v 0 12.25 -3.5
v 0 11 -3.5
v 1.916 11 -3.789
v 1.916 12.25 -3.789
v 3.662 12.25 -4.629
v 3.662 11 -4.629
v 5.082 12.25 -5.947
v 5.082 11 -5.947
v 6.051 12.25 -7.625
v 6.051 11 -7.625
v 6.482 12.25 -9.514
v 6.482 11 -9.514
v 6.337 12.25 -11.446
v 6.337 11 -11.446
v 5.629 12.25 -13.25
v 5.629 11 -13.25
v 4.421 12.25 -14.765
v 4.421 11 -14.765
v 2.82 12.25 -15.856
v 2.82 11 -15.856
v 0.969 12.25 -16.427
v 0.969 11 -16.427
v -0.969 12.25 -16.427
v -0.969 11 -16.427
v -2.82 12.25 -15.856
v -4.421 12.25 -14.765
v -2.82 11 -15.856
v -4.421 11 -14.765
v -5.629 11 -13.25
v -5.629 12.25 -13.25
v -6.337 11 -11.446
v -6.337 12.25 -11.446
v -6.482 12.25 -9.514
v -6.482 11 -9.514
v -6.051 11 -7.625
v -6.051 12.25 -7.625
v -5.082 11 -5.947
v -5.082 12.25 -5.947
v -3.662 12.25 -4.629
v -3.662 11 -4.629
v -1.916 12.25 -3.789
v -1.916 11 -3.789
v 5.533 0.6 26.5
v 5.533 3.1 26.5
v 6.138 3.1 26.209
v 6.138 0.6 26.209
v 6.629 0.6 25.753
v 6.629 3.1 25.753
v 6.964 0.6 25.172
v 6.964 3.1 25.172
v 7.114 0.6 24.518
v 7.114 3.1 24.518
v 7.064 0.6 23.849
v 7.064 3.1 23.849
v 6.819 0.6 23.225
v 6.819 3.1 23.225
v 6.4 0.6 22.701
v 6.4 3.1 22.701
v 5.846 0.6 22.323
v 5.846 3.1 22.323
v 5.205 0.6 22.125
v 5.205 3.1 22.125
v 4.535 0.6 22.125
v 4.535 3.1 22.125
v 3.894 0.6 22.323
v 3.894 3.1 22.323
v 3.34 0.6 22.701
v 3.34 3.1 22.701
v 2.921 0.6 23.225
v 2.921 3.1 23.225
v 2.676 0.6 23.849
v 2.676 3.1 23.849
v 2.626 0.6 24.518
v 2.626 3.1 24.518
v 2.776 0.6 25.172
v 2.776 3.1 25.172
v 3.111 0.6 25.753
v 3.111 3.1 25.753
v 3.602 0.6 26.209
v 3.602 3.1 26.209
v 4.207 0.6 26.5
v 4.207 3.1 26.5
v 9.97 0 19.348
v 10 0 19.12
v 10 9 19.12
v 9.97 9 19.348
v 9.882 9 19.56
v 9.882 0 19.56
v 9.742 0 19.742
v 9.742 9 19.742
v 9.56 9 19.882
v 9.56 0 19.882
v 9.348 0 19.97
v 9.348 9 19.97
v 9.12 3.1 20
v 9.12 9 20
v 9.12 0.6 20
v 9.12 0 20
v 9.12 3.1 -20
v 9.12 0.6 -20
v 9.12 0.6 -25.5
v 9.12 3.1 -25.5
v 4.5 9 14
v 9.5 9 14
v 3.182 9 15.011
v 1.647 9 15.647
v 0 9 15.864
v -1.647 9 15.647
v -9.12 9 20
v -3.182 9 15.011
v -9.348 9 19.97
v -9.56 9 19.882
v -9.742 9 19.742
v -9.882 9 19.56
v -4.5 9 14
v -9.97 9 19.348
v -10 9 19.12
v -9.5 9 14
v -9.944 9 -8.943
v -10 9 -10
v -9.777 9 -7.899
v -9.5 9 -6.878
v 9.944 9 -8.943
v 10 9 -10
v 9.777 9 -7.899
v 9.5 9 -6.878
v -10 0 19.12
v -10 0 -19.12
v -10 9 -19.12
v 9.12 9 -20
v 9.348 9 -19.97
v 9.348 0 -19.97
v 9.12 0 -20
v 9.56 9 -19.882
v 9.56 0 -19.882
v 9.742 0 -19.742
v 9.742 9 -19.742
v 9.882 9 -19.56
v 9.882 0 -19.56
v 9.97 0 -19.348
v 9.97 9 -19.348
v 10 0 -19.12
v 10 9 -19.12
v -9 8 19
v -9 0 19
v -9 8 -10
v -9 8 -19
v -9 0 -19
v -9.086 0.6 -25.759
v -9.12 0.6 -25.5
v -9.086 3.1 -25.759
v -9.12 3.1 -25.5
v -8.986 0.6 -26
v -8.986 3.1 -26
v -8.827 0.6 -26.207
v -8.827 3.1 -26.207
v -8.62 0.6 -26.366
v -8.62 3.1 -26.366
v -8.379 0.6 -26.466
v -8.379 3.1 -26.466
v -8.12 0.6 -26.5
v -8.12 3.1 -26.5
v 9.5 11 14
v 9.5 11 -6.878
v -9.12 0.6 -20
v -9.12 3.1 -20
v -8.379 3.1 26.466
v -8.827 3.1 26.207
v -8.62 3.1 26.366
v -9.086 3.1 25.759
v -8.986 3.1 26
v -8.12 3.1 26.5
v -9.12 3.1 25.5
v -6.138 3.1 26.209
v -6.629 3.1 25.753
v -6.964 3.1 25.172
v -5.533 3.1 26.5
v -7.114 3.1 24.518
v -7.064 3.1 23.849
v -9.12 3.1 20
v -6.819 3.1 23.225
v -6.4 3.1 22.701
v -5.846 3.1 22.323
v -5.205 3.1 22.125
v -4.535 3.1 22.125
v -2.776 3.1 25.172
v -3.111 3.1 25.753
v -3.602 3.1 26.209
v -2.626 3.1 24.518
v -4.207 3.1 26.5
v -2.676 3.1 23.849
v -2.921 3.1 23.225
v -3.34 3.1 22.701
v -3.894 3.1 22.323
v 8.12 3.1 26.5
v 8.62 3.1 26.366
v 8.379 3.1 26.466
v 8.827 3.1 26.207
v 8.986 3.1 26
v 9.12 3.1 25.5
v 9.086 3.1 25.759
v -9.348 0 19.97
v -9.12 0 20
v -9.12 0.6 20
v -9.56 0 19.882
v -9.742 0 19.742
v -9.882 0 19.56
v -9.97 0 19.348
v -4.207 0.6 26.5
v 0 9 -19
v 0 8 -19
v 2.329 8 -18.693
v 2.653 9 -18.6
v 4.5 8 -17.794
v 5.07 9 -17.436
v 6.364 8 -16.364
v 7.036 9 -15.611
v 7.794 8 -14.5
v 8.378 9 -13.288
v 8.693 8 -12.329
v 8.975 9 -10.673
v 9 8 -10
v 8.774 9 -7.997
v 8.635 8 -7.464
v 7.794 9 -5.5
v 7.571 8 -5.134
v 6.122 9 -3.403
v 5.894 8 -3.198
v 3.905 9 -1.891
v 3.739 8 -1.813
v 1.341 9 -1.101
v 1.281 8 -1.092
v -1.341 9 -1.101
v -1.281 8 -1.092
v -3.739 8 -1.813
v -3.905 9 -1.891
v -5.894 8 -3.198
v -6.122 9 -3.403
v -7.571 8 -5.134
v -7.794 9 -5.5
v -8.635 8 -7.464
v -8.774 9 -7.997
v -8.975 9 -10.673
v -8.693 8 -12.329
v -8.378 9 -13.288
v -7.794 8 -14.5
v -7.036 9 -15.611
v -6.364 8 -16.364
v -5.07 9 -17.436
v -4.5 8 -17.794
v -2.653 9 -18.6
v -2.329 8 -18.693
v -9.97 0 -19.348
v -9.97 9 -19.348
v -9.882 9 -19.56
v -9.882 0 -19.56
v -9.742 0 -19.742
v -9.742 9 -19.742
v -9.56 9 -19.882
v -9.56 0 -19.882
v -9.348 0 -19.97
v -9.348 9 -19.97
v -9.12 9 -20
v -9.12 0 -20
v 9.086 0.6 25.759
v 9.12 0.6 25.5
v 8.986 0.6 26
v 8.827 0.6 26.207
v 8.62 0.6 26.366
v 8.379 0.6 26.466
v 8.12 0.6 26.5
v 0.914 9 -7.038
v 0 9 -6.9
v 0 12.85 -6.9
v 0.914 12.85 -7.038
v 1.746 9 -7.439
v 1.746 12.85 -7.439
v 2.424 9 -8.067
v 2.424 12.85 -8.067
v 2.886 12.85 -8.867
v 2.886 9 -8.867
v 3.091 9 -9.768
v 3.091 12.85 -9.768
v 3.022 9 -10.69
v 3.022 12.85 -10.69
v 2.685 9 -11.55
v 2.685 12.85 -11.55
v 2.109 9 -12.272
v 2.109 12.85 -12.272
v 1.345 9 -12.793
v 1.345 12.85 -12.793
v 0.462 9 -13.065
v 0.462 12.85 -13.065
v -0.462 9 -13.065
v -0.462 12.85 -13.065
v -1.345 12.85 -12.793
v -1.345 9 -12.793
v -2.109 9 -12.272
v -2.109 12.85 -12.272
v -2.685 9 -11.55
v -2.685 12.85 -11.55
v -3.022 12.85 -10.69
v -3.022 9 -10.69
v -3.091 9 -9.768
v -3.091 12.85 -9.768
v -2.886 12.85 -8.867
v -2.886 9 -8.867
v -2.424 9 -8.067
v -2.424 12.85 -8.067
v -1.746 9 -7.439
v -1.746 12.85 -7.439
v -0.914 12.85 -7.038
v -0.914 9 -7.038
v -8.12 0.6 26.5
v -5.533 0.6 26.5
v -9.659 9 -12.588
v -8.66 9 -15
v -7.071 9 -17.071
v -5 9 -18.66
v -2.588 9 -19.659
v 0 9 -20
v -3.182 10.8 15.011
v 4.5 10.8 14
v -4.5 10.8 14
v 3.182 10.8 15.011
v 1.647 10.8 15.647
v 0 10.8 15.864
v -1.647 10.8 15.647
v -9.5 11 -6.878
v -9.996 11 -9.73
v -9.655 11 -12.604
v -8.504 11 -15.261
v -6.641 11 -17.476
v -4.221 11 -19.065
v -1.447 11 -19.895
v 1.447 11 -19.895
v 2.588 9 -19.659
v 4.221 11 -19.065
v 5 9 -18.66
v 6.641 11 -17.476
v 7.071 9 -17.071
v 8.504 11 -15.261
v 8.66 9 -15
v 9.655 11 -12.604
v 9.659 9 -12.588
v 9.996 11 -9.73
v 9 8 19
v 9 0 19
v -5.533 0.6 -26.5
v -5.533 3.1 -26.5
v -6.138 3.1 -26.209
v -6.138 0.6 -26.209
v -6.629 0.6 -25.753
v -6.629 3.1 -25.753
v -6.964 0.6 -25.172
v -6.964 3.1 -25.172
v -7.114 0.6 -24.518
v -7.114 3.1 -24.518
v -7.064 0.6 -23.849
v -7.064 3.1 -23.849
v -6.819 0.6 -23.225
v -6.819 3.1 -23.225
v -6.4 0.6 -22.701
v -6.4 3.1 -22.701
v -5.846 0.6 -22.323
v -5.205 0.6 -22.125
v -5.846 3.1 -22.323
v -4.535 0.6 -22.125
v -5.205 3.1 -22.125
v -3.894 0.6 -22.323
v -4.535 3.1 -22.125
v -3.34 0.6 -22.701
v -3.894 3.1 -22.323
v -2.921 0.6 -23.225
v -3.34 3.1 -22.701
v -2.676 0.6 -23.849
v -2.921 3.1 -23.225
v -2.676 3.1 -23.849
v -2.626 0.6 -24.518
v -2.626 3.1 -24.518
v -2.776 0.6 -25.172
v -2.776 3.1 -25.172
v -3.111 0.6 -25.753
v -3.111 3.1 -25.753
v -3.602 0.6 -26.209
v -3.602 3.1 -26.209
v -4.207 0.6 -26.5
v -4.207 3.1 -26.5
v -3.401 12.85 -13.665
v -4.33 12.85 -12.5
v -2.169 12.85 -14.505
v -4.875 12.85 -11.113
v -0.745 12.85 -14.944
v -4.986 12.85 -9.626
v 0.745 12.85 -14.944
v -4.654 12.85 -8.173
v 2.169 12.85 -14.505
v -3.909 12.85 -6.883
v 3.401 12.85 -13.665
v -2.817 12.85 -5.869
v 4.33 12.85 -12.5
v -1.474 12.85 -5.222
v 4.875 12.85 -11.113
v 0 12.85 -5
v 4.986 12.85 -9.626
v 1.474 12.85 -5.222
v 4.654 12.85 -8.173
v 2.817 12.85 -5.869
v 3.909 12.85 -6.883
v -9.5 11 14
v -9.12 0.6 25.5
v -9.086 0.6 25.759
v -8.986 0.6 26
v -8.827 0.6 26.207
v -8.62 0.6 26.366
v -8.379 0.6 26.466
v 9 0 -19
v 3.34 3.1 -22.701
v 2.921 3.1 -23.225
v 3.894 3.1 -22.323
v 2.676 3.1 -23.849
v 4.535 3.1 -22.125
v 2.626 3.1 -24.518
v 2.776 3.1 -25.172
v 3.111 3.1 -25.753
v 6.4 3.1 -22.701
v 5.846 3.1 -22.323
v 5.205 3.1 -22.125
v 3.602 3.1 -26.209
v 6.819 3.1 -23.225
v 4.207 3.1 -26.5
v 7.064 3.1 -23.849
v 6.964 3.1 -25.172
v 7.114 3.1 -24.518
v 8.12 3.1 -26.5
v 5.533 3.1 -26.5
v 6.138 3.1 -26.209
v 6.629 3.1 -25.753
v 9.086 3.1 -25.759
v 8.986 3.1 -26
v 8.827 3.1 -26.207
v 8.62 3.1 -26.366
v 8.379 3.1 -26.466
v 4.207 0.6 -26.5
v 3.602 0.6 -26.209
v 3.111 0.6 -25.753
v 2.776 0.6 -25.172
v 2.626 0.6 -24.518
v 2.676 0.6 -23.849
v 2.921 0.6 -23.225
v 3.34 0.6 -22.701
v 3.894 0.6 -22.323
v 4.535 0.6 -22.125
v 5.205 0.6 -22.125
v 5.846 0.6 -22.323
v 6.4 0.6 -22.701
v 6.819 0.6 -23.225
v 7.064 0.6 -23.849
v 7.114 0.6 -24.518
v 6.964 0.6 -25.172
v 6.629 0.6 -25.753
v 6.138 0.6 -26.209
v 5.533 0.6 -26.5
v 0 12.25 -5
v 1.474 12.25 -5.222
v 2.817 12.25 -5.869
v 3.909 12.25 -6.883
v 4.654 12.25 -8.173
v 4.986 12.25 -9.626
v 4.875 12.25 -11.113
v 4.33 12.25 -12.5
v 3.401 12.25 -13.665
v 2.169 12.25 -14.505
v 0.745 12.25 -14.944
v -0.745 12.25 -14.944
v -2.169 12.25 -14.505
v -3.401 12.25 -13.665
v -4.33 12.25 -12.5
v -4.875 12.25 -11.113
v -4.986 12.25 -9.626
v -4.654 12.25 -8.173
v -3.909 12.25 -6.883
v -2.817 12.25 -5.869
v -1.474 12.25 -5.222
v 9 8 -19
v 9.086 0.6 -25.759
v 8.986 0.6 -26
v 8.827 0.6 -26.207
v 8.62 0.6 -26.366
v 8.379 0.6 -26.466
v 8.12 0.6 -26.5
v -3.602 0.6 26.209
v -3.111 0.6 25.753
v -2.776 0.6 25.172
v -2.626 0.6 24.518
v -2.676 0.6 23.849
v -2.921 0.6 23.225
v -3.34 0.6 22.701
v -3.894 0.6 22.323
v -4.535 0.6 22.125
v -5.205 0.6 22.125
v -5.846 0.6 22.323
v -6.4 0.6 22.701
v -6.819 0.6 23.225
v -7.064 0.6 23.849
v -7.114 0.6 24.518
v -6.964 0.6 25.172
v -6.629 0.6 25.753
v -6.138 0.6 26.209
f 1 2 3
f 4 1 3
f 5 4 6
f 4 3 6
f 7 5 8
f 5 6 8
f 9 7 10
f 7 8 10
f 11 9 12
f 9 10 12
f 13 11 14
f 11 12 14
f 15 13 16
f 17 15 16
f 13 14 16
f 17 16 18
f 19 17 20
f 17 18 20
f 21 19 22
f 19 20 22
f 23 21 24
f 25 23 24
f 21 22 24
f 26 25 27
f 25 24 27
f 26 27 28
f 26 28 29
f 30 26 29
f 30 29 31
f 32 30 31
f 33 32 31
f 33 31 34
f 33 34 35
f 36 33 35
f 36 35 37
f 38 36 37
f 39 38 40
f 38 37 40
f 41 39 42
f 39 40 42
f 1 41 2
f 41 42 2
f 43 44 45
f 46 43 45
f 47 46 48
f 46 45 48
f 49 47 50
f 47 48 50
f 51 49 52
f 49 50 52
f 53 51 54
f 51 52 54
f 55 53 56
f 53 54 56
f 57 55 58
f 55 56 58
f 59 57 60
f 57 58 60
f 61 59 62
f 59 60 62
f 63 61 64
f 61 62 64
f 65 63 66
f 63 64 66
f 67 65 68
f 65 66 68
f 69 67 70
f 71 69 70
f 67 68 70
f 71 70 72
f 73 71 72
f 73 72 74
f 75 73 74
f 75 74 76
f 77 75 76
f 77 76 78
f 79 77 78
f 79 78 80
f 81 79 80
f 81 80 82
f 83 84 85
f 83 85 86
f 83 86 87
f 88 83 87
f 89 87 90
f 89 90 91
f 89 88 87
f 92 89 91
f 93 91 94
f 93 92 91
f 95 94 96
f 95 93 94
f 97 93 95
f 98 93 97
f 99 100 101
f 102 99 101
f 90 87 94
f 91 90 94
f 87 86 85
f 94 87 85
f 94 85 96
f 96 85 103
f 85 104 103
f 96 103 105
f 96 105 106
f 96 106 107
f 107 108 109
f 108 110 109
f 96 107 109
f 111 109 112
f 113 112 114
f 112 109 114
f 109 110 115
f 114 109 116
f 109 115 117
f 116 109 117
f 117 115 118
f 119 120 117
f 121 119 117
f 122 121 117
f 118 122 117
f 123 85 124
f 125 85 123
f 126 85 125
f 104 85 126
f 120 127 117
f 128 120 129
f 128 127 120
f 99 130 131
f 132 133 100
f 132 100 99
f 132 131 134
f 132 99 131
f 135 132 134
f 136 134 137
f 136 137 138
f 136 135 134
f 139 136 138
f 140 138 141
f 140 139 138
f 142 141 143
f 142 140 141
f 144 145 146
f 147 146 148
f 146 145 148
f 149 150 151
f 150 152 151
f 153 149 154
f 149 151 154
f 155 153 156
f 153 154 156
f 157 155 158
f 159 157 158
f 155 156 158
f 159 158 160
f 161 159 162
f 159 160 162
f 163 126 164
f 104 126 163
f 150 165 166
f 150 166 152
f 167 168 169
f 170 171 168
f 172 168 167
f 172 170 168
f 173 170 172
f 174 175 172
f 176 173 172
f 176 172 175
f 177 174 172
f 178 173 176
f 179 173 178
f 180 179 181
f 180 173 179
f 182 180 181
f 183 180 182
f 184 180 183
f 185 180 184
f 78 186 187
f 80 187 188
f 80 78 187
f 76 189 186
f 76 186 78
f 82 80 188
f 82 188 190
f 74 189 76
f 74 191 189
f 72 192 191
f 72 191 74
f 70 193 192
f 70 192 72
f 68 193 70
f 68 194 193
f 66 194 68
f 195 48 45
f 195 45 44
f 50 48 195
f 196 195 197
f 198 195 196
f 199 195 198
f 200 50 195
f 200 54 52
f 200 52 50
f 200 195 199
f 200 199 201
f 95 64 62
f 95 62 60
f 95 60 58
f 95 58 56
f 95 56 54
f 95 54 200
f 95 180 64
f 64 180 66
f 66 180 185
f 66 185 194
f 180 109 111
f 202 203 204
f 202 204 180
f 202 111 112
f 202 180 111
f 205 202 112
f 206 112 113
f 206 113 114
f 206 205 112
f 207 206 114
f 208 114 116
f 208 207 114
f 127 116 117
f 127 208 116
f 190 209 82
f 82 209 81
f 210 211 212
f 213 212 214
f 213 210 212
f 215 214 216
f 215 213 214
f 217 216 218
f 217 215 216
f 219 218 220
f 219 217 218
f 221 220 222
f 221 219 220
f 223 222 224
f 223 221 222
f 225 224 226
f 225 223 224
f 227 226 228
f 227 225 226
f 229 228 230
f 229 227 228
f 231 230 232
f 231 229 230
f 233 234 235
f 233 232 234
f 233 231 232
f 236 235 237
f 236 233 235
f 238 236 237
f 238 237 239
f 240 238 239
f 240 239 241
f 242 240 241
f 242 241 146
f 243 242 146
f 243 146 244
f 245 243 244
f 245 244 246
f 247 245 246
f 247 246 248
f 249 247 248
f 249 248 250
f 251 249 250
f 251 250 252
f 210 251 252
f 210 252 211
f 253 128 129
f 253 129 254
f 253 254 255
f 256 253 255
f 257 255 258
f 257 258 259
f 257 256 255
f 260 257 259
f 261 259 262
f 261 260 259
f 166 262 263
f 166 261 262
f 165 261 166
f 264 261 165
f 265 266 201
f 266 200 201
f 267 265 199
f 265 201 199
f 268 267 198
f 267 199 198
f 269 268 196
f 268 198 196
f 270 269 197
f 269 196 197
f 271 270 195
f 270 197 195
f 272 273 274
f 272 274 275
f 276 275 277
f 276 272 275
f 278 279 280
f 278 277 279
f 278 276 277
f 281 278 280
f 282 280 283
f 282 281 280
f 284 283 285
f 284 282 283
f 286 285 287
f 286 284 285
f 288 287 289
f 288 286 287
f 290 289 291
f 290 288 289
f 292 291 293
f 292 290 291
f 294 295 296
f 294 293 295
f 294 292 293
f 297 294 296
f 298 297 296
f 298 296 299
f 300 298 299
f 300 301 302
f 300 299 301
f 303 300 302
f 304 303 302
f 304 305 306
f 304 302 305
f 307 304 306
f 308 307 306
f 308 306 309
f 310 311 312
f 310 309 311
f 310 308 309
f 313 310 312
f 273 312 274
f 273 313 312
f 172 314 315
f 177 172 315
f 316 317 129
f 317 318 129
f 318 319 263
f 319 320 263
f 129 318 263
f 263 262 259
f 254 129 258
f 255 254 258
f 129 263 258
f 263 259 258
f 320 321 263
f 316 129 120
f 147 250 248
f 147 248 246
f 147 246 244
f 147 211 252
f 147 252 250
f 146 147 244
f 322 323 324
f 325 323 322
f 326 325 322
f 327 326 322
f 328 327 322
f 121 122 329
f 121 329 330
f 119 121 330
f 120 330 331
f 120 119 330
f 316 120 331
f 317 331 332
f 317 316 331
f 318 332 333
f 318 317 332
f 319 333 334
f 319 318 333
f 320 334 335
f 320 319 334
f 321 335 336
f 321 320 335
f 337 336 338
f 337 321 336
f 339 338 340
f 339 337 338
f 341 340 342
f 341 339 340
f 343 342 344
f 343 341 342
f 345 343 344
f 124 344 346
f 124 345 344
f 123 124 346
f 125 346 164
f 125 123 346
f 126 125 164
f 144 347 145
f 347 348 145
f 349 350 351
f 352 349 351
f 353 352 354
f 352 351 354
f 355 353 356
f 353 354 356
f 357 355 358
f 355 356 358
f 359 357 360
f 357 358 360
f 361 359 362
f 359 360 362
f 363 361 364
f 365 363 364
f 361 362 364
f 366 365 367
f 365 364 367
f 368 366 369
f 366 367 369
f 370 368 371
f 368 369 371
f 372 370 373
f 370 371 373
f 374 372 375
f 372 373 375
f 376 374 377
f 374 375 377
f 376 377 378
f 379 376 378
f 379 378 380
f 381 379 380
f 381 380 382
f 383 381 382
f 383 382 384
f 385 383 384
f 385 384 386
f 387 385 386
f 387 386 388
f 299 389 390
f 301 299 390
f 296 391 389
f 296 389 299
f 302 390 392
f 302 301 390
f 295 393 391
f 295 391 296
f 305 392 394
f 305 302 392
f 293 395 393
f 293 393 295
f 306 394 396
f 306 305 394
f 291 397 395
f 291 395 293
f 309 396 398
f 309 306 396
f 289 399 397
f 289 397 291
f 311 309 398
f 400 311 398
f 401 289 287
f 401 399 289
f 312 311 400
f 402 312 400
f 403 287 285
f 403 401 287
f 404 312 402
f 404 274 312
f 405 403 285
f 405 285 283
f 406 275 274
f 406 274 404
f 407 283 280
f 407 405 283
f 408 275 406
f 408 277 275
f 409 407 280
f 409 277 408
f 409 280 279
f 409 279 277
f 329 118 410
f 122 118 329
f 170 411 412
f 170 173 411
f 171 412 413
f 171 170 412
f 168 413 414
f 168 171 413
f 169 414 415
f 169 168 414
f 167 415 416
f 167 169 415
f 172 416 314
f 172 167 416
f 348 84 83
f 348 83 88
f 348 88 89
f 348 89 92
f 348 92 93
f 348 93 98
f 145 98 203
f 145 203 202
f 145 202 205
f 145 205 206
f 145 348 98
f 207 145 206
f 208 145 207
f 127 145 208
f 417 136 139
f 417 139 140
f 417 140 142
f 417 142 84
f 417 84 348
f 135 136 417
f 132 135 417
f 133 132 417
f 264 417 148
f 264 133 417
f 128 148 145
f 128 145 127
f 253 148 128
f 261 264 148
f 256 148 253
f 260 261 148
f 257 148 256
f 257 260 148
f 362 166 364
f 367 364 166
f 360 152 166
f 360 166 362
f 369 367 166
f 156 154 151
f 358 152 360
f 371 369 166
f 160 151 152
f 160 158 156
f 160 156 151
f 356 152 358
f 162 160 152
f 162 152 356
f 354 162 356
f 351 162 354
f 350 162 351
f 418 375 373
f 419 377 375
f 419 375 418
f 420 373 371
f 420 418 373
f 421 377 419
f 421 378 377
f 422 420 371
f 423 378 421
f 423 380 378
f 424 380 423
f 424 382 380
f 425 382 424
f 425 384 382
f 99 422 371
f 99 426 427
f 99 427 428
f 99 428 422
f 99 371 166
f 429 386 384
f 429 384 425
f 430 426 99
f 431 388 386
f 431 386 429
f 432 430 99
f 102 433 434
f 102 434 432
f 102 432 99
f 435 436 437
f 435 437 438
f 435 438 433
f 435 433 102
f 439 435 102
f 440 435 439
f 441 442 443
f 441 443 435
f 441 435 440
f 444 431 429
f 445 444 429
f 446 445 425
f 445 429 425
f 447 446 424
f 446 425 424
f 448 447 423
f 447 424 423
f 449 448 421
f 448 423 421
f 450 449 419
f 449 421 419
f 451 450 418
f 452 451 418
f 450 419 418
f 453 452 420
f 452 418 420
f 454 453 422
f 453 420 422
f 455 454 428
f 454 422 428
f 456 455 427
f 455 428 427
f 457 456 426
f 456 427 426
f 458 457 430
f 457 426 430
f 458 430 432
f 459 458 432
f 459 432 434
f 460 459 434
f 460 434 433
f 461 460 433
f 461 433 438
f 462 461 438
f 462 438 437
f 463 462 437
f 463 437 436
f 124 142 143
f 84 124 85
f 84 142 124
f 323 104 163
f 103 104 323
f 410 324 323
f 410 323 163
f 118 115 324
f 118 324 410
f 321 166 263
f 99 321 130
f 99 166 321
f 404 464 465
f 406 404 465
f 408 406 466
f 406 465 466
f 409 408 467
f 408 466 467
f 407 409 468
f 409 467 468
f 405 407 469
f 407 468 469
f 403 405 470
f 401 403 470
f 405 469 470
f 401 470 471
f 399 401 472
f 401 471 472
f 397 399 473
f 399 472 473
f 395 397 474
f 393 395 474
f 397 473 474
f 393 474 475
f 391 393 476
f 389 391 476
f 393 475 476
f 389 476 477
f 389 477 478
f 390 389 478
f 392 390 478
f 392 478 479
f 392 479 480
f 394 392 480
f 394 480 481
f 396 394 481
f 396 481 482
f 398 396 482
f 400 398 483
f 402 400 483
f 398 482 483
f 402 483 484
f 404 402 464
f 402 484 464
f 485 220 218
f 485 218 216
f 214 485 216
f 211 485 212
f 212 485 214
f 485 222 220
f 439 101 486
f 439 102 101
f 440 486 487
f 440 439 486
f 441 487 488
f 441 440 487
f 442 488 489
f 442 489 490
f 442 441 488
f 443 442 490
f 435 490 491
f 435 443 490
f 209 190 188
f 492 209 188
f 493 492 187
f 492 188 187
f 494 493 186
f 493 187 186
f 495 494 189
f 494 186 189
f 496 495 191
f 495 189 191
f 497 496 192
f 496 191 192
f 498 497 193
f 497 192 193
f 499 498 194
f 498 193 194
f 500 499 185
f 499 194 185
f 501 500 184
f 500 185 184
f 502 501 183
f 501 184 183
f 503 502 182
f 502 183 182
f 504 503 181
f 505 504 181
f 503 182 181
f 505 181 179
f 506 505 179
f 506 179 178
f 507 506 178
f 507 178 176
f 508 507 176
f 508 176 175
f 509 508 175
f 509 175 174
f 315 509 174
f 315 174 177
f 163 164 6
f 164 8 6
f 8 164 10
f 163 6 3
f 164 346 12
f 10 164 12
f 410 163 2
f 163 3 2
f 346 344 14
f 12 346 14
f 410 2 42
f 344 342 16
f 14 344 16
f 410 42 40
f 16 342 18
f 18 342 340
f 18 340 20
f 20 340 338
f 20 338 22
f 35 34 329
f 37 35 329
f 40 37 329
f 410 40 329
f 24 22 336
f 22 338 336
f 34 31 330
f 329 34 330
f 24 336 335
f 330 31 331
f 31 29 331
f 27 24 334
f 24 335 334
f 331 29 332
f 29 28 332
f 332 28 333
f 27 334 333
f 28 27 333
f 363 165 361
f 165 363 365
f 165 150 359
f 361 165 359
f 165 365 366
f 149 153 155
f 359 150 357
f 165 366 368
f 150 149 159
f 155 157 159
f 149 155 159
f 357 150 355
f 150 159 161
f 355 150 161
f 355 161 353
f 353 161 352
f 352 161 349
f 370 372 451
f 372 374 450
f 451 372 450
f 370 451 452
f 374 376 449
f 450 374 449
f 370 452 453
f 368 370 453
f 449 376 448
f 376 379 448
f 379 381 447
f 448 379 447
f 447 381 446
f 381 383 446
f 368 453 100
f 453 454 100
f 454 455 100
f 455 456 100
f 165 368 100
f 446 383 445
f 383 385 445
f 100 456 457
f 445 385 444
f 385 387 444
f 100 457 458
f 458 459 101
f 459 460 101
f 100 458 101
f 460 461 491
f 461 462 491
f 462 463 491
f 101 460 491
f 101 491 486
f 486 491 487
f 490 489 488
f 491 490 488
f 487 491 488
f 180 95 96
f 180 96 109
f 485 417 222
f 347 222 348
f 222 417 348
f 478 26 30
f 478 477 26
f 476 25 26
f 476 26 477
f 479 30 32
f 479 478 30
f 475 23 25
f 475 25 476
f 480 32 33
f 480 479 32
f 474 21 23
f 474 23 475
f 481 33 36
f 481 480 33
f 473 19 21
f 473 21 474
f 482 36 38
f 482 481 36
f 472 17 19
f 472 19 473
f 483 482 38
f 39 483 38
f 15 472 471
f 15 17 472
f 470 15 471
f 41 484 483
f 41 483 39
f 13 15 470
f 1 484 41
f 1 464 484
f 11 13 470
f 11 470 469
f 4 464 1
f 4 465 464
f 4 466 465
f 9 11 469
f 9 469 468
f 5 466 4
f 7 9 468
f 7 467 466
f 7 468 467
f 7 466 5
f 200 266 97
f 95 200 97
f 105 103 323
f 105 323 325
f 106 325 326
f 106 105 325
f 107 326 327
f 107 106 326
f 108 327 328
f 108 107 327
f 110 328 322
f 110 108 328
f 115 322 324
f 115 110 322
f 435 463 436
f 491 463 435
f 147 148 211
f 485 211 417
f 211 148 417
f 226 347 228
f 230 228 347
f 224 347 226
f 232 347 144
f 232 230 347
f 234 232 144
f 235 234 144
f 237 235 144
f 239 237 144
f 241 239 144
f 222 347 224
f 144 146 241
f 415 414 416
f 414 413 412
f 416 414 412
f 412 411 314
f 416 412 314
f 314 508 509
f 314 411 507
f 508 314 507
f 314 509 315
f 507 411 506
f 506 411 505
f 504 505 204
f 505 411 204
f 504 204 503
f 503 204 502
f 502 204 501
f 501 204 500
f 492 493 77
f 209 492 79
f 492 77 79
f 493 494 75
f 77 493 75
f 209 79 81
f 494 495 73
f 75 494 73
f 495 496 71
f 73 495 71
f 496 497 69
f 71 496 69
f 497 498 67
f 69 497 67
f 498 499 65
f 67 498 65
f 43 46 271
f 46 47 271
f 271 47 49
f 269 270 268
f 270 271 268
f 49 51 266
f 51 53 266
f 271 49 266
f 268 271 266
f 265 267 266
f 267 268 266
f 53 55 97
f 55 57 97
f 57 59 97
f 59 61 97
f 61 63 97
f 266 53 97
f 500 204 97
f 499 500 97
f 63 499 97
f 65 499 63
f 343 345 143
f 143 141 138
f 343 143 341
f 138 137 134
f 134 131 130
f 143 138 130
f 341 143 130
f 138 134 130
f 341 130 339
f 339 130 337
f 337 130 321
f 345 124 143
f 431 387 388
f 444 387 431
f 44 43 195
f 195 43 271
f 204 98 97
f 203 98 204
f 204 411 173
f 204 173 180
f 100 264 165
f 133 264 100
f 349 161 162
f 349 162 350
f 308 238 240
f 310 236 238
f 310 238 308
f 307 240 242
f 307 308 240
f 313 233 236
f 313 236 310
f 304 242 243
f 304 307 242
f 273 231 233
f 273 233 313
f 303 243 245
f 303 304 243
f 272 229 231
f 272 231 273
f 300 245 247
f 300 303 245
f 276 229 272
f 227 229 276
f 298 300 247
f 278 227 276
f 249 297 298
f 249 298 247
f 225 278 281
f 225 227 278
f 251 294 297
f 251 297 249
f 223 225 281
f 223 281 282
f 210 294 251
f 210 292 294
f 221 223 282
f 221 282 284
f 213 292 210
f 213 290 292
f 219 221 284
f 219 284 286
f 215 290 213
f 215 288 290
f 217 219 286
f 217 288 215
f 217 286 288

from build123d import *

# Parameters (mm, degrees)
BOSS_EXTRUDE1_DEPTH     = 9
SHELL1_T                = -1
BOSS_EXTRUDE2_DEPTH     = 2
SKETCH3_R               = 6.5
BOSS_EXTRUDE3_DEPTH     = 1.25
SKETCH4_R               = 5
BOSS_EXTRUDE4_DEPTH     = 0.6
CUT_EXTRUDE1_DEPTH      = 26.78996898
CUT_EXTRUDE1_DEPTH_BACK = 26.78996898
SKETCH5_R               = 3.1
BOSS_EXTRUDE5_DEPTH     = 1.8
SKETCH7_W               = 18.24
SKETCH7_H               = 6.5
BOSS_EXTRUDE6_DEPTH     = 2.5
CUT_EXTRUDE2_REACH      = 31.955
SKETCH8_R               = 2.25
FILLET2_R               = 1
CUT_EXTRUDE3_DEPTH      = 30.432125306
CUT_EXTRUDE3_DEPTH_BACK = 1
SKETCH9_R               = 9


with BuildPart() as part:
    # Sketch1 → Boss-Extrude1 (new body)
    with BuildSketch(Plane(origin=(0, 0, 0), x_dir=(1, 0, 0), z_dir=(0, 1, 0))):
        with BuildLine():
            Line((-9.12, 20), (9.12, 20))
            ThreePointArc((9.12, 20), (9.742253967, 19.742253967), (10, 19.12))
            Line((10, 19.12), (10, -19.12))
            ThreePointArc((10, -19.12), (9.742253967, -19.742253967), (9.12, -20))
            Line((9.12, -20), (-9.12, -20))
            ThreePointArc((-9.12, -20), (-9.742253967, -19.742253967), (-10, -19.12))
            Line((-10, -19.12), (-10, 19.12))
            ThreePointArc((-10, 19.12), (-9.742253967, 19.742253967), (-9.12, 20))
        make_face()
    extrude(amount=BOSS_EXTRUDE1_DEPTH)

    # Shell1
    shell1_openings = [part.faces().sort_by_distance(p)[0] for p in [
        (0, 0, 0),
    ]]
    offset(amount=SHELL1_T, openings=shell1_openings, kind=Kind.INTERSECTION)

    # Sketch2 → Boss-Extrude2 (add)
    with BuildSketch(Plane(origin=(0, 9, 0), x_dir=(1, 0, 0), z_dir=(0, 1, 0))):
        with BuildLine():
            Line((9.5, -14), (-9.5, -14))
            Line((-9.5, -14), (-9.5, 6.877501001))
            ThreePointArc((-9.5, 6.877501001), (0, 20), (9.5, 6.877501001))
            Line((9.5, 6.877501001), (9.5, -14))
        make_face()
    extrude(amount=BOSS_EXTRUDE2_DEPTH)

    # Sketch3 → Boss-Extrude3 (add)
    with BuildSketch(Plane(origin=(0, 11, 0), x_dir=(1, 0, 0), z_dir=(0, 1, 0))):
        with Locations(Location((0, 10, 0), (0, 0, 270))):
            Circle(SKETCH3_R)
    extrude(amount=BOSS_EXTRUDE3_DEPTH)

    # Sketch4 → Boss-Extrude4 (add)
    with BuildSketch(Plane(origin=(0, 12.25, 0), x_dir=(1, 0, 0), z_dir=(0, 1, 0))):
        with Locations(Location((0, 10, 0), (0, 0, 270))):
            Circle(SKETCH4_R)
    extrude(amount=BOSS_EXTRUDE4_DEPTH)

    # Sketch5 → Cut-Extrude1 (cut, two sides: drawn at the far end of the back side and taken through both)
    with BuildSketch(Plane(origin=(0, 12.85, 0), x_dir=(1, 0, 0), z_dir=(0, 1, 0)).offset(-CUT_EXTRUDE1_DEPTH_BACK)):
        with Locations(Location((0, 10, 0), (0, 0, 270))):
            Circle(SKETCH5_R)
    extrude(amount=CUT_EXTRUDE1_DEPTH + CUT_EXTRUDE1_DEPTH_BACK, mode=Mode.SUBTRACT)

    # Sketch6 → Boss-Extrude5 (add)
    with BuildSketch(Plane(origin=(0, 9, 0), x_dir=(1, 0, 0), z_dir=(0, 1, 0))):
        with BuildLine():
            Line((-4.5, -14), (4.5, -14))
            ThreePointArc((4.5, -14), (0, -15.863961031), (-4.5, -14))
        make_face()
    extrude(amount=BOSS_EXTRUDE5_DEPTH)

    # Sketch7 → Boss-Extrude6 (add)
    with BuildSketch(Plane(origin=(0, 0.6, 0), x_dir=(1, 0, 0), z_dir=(0, 1, 0))):
        with Locations((0, 23.25)):
            Rectangle(SKETCH7_W, SKETCH7_H)
        with Locations((0, -23.25)):
            Rectangle(SKETCH7_W, SKETCH7_H)
    extrude(amount=BOSS_EXTRUDE6_DEPTH)

    # Sketch8 → Cut-Extrude2 (cut, up to next)
    with BuildSketch(Plane(origin=(0, 3.1, 0), x_dir=(1, 0, 0), z_dir=(0, 1, 0)), mode=Mode.PRIVATE) as cut_extrude2_sk1:
        with Locations((-4.87, 24.35)):
            Circle(SKETCH8_R)
    cut_extrude2_tool1 = extrude(cut_extrude2_sk1.sketch, amount=-CUT_EXTRUDE2_REACH, mode=Mode.PRIVATE) & part.part
    # Sketch8 → Cut-Extrude2 (cut, up to next)
    with BuildSketch(Plane(origin=(0, 3.1, 0), x_dir=(1, 0, 0), z_dir=(0, 1, 0)), mode=Mode.PRIVATE) as cut_extrude2_sk2:
        with Locations((4.87, 24.35)):
            Circle(SKETCH8_R)
    cut_extrude2_tool2 = extrude(cut_extrude2_sk2.sketch, amount=-CUT_EXTRUDE2_REACH, mode=Mode.PRIVATE) & part.part
    # Sketch8 → Cut-Extrude2 (cut, up to next)
    with BuildSketch(Plane(origin=(0, 3.1, 0), x_dir=(1, 0, 0), z_dir=(0, 1, 0)), mode=Mode.PRIVATE) as cut_extrude2_sk3:
        with Locations((-4.87, -24.35)):
            Circle(SKETCH8_R)
    cut_extrude2_tool3 = extrude(cut_extrude2_sk3.sketch, amount=-CUT_EXTRUDE2_REACH, mode=Mode.PRIVATE) & part.part
    # Sketch8 → Cut-Extrude2 (cut, up to next)
    with BuildSketch(Plane(origin=(0, 3.1, 0), x_dir=(1, 0, 0), z_dir=(0, 1, 0)), mode=Mode.PRIVATE) as cut_extrude2_sk4:
        with Locations((4.87, -24.35)):
            Circle(SKETCH8_R)
    cut_extrude2_tool4 = extrude(cut_extrude2_sk4.sketch, amount=-CUT_EXTRUDE2_REACH, mode=Mode.PRIVATE) & part.part
    add(cut_extrude2_tool1.solids().sort_by_distance((-4.87, 3.1, -24.35))[0], mode=Mode.SUBTRACT)
    add(cut_extrude2_tool2.solids().sort_by_distance((4.87, 3.1, -24.35))[0], mode=Mode.SUBTRACT)
    add(cut_extrude2_tool3.solids().sort_by_distance((-4.87, 3.1, 24.35))[0], mode=Mode.SUBTRACT)
    add(cut_extrude2_tool4.solids().sort_by_distance((4.87, 3.1, 24.35))[0], mode=Mode.SUBTRACT)

    # Fillet2
    fillet2_edges = [part.edges().sort_by_distance(p)[0] for p in [
        (9.12, 1.85, -26.5),
        (-9.12, 1.85, -26.5),
        (-9.12, 1.85, 26.5),
        (9.12, 1.85, 26.5),
    ]]
    fillet(fillet2_edges, radius=FILLET2_R)

    # Sketch9 → Cut-Extrude3 (cut, two sides: drawn at the far end of the back side and taken through both)
    with BuildSketch(Plane.XZ.offset(-8).offset(-CUT_EXTRUDE3_DEPTH_BACK)):
        with Locations(Location((0, -10, 0), (0, 0, 270))):
            Circle(SKETCH9_R)
    extrude(amount=CUT_EXTRUDE3_DEPTH + CUT_EXTRUDE3_DEPTH_BACK, mode=Mode.SUBTRACT)


solid = part.part
